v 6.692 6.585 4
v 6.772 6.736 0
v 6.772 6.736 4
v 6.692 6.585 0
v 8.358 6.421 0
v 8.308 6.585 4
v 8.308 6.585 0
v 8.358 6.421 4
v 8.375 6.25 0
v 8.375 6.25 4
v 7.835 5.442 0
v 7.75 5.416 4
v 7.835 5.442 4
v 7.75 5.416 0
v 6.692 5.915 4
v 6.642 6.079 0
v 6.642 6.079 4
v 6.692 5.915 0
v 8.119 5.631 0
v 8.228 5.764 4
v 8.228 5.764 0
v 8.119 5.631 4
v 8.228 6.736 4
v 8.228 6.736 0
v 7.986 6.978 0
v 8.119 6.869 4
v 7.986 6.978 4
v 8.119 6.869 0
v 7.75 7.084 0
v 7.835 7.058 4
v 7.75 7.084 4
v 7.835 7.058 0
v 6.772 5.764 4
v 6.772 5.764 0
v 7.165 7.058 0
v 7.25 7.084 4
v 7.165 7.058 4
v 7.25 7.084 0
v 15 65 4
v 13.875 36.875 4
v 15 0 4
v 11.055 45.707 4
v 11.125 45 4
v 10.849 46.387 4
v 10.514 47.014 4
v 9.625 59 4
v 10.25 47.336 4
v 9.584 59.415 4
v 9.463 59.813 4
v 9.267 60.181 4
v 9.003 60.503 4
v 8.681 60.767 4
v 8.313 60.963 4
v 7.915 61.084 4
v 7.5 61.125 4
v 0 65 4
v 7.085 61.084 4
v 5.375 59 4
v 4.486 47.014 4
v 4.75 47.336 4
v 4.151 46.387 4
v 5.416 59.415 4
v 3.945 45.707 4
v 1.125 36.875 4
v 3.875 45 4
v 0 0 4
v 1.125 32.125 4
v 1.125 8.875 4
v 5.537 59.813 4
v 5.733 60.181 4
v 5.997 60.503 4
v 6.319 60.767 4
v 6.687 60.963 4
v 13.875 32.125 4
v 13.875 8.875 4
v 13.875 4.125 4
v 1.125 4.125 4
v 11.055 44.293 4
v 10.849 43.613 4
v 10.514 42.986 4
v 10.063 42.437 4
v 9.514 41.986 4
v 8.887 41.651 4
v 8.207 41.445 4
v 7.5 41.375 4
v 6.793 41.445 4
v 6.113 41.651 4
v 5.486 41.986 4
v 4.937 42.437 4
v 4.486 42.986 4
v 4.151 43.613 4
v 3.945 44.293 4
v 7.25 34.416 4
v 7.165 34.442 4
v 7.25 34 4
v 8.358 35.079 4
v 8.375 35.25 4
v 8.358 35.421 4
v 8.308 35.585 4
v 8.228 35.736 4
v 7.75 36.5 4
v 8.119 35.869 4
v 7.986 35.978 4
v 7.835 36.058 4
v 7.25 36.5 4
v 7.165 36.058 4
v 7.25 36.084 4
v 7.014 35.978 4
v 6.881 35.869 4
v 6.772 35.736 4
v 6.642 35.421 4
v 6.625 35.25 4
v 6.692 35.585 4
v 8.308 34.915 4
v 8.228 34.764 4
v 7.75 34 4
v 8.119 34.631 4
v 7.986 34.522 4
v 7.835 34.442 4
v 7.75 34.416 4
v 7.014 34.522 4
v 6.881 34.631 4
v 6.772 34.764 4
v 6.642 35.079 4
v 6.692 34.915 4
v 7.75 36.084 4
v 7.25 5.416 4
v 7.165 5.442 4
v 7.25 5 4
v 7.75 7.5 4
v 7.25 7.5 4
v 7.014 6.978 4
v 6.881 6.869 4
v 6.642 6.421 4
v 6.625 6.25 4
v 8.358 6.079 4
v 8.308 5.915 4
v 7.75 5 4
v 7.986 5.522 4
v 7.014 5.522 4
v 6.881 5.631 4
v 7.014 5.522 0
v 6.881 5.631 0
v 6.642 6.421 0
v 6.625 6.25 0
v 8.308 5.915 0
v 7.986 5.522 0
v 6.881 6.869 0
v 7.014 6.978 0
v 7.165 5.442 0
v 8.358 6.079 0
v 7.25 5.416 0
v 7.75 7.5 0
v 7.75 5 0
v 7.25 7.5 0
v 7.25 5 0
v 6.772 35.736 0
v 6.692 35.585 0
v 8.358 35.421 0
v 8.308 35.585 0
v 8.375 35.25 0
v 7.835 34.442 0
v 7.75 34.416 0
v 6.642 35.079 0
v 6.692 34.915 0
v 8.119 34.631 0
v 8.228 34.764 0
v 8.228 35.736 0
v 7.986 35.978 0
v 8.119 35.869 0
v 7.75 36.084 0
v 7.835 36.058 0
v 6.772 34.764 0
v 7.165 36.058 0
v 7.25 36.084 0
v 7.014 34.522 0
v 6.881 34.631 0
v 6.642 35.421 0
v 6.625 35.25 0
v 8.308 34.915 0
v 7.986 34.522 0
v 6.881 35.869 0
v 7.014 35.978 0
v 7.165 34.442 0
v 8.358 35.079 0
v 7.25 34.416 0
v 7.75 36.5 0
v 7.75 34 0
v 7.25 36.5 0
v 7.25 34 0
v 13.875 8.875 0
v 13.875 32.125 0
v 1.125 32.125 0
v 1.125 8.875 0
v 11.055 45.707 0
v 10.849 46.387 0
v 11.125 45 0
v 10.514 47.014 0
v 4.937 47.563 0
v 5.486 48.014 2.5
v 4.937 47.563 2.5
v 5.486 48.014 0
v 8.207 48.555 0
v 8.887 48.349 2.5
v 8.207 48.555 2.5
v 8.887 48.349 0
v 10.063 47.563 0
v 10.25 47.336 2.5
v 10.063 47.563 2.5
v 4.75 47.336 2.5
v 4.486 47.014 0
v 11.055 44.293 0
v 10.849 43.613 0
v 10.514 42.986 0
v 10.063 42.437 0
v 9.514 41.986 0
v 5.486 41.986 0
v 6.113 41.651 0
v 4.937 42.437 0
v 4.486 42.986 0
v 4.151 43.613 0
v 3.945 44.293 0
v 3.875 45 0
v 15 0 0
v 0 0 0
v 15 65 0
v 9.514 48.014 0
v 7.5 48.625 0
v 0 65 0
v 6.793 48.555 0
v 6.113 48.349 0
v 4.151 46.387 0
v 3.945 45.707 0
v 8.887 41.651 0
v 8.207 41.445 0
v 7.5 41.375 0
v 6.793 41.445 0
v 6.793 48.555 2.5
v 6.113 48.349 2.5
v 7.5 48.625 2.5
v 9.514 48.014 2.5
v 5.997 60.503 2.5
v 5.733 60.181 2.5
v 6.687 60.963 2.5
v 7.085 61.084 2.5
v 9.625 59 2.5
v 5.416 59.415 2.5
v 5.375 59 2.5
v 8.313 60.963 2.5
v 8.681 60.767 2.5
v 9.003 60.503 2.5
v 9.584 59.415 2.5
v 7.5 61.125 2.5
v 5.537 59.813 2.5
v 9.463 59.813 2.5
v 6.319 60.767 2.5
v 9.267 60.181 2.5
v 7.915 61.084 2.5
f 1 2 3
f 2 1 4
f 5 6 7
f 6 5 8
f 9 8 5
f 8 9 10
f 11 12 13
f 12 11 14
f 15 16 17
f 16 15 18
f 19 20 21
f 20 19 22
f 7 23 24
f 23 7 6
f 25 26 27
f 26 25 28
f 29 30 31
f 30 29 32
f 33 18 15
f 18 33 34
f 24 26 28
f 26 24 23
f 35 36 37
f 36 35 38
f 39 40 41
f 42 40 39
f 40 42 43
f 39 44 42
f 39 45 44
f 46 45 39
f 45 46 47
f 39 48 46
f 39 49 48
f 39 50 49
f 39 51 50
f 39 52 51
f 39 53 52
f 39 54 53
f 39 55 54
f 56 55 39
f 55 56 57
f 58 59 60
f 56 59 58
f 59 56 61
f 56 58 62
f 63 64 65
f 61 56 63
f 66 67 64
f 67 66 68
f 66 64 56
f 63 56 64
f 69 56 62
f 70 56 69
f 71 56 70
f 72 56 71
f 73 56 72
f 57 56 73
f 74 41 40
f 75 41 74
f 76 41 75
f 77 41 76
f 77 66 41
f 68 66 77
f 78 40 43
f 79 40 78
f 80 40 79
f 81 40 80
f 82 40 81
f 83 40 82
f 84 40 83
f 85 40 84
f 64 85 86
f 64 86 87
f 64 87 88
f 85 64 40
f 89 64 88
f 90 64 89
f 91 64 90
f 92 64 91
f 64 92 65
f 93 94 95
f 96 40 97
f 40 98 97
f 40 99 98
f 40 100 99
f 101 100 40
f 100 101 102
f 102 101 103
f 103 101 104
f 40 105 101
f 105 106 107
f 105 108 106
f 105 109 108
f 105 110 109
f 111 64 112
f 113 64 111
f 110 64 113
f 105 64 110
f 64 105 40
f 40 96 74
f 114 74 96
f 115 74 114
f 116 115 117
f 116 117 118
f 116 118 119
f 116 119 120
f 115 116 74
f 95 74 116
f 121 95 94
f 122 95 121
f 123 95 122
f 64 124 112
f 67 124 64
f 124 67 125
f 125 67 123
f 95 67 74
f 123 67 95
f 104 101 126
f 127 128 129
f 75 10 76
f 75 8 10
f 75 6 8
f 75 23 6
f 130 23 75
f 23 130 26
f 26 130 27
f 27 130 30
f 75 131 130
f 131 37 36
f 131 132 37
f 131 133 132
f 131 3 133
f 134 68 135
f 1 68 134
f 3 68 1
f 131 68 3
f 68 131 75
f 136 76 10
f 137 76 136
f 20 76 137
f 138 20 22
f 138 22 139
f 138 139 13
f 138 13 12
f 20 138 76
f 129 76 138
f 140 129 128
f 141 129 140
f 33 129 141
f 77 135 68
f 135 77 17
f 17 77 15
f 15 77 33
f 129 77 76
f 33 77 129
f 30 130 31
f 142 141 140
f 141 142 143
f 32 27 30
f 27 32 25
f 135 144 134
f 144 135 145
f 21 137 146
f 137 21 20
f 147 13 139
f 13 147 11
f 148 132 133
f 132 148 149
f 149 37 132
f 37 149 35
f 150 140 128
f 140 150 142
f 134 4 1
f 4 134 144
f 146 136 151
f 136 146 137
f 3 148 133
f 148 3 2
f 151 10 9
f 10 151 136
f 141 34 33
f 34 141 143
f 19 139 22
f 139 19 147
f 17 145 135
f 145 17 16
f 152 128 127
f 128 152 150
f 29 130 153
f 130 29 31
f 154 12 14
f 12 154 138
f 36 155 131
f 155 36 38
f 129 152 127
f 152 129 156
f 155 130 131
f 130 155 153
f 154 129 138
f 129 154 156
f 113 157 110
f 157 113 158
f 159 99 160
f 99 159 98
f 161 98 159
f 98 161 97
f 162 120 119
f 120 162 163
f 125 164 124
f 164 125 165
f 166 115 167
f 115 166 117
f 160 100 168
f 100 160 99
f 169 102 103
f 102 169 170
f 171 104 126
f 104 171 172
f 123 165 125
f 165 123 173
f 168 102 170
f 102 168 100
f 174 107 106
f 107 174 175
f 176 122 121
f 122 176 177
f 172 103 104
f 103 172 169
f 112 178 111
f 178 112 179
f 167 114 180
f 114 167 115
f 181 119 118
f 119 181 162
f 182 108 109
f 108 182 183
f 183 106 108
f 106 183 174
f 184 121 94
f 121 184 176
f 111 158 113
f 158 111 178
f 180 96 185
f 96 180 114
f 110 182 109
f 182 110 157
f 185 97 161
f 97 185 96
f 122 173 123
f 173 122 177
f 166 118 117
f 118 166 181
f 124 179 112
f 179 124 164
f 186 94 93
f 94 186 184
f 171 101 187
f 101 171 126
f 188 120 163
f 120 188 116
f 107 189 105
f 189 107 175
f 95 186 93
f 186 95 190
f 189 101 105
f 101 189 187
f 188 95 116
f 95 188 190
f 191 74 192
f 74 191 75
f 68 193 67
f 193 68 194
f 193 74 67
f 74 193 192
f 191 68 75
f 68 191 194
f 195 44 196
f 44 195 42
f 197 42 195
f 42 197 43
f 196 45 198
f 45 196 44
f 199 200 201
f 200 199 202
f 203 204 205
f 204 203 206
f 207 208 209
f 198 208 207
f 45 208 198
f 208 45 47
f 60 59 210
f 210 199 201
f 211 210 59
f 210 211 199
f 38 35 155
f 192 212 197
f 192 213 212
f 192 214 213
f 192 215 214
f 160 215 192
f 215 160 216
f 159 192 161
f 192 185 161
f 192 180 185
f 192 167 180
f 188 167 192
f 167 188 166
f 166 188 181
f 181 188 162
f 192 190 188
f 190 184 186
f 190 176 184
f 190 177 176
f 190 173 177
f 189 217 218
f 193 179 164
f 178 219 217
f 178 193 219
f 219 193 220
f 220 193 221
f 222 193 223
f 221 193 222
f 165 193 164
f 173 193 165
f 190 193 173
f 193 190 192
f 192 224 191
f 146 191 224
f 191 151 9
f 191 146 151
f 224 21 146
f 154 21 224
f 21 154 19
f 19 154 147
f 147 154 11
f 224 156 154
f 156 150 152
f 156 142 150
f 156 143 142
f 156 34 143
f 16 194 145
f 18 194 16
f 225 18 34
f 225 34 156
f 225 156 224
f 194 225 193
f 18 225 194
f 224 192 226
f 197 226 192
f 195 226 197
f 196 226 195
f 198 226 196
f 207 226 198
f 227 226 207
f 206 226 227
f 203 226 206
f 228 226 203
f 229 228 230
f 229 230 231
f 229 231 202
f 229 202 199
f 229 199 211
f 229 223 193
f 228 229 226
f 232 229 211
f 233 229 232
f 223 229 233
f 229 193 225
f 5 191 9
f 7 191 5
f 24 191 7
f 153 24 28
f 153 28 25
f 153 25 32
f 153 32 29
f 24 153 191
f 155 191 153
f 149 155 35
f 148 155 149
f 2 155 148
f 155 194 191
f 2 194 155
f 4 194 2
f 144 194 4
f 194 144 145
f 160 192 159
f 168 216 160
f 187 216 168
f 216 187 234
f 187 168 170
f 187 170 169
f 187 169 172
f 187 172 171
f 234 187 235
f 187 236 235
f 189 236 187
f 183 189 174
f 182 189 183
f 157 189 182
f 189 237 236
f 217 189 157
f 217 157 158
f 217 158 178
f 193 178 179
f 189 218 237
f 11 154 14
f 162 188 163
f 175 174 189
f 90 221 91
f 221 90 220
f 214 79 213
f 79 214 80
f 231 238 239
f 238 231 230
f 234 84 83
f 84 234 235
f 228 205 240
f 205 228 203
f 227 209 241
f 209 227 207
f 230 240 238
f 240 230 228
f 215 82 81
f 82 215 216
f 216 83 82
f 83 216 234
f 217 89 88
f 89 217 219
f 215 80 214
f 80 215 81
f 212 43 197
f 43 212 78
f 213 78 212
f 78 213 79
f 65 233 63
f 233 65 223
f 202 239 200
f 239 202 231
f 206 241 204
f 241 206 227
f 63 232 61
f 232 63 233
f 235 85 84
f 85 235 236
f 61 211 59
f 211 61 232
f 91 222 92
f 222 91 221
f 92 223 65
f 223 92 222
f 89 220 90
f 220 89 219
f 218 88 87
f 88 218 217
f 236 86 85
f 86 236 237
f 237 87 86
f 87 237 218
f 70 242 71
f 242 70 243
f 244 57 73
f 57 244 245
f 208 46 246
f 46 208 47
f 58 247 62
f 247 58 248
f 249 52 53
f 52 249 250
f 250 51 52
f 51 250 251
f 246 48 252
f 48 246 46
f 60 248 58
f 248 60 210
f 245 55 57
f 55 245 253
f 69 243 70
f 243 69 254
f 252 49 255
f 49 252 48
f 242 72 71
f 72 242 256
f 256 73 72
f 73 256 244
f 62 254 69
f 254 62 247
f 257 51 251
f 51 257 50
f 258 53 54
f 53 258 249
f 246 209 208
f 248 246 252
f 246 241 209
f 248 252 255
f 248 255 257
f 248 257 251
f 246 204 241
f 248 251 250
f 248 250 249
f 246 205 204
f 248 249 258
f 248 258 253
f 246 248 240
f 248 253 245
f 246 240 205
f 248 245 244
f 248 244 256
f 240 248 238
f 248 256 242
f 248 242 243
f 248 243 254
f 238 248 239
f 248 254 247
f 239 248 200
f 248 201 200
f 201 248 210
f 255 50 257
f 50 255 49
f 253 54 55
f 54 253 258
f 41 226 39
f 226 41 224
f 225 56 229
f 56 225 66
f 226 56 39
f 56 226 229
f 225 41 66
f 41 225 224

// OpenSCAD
$fn = 32;

// the motor will be this much wider horizontally, so that holes made by difference with it will have tolerance.
// this will also be added to the radius of the horns circles.
toleranceGap = 0.25; 

module sg90()
{
    union()
    {
         // Body
        translate([0, 5.5, -6.5])
        cube([12.5 + toleranceGap, 23 + toleranceGap, 24], true);
        // Collar
        translate([0, 5.5, 2.5/2])
        cube([12.5 + toleranceGap, 32.5 + toleranceGap, 2.5], true);
        // Raise
        translate([0, 0, 24-18.5])
        cylinder(h=4.5, d=11.5);
        
        // Screw holes

        translate([0, -11.5/2-3, -4.5])
        union()
        {
            cylinder(h=4.5, d=1.75);
            translate([0, 0, 2.25])
            cube([0.5, 2.5, 4.5], true);
        }
        translate([0, -11.5/2+26, -4.5])
        union()
        {
            cylinder(h=4.5, d=1.75);
            translate([0, 0, 2.25])
            cube([0.5, 2.5, 4.5], true);
        }
    }
}

module horn()
{
    // Bottom part
    translate([0, 0, -2.5])
    cylinder(h=4, d=7+toleranceGap);
    // Horn part
    hull()
    {
        translate([0, 14, 0])
        cylinder(h=1.5, d=4+toleranceGap);
        cylinder(h=1.5, d=5.5+toleranceGap);
    }
}

difference()
{
    cube([15, 65, 4]);
    translate([15/2, 15, 4])
    #sg90();
    translate([15/2, 45, 2.5])
    #horn();
}
